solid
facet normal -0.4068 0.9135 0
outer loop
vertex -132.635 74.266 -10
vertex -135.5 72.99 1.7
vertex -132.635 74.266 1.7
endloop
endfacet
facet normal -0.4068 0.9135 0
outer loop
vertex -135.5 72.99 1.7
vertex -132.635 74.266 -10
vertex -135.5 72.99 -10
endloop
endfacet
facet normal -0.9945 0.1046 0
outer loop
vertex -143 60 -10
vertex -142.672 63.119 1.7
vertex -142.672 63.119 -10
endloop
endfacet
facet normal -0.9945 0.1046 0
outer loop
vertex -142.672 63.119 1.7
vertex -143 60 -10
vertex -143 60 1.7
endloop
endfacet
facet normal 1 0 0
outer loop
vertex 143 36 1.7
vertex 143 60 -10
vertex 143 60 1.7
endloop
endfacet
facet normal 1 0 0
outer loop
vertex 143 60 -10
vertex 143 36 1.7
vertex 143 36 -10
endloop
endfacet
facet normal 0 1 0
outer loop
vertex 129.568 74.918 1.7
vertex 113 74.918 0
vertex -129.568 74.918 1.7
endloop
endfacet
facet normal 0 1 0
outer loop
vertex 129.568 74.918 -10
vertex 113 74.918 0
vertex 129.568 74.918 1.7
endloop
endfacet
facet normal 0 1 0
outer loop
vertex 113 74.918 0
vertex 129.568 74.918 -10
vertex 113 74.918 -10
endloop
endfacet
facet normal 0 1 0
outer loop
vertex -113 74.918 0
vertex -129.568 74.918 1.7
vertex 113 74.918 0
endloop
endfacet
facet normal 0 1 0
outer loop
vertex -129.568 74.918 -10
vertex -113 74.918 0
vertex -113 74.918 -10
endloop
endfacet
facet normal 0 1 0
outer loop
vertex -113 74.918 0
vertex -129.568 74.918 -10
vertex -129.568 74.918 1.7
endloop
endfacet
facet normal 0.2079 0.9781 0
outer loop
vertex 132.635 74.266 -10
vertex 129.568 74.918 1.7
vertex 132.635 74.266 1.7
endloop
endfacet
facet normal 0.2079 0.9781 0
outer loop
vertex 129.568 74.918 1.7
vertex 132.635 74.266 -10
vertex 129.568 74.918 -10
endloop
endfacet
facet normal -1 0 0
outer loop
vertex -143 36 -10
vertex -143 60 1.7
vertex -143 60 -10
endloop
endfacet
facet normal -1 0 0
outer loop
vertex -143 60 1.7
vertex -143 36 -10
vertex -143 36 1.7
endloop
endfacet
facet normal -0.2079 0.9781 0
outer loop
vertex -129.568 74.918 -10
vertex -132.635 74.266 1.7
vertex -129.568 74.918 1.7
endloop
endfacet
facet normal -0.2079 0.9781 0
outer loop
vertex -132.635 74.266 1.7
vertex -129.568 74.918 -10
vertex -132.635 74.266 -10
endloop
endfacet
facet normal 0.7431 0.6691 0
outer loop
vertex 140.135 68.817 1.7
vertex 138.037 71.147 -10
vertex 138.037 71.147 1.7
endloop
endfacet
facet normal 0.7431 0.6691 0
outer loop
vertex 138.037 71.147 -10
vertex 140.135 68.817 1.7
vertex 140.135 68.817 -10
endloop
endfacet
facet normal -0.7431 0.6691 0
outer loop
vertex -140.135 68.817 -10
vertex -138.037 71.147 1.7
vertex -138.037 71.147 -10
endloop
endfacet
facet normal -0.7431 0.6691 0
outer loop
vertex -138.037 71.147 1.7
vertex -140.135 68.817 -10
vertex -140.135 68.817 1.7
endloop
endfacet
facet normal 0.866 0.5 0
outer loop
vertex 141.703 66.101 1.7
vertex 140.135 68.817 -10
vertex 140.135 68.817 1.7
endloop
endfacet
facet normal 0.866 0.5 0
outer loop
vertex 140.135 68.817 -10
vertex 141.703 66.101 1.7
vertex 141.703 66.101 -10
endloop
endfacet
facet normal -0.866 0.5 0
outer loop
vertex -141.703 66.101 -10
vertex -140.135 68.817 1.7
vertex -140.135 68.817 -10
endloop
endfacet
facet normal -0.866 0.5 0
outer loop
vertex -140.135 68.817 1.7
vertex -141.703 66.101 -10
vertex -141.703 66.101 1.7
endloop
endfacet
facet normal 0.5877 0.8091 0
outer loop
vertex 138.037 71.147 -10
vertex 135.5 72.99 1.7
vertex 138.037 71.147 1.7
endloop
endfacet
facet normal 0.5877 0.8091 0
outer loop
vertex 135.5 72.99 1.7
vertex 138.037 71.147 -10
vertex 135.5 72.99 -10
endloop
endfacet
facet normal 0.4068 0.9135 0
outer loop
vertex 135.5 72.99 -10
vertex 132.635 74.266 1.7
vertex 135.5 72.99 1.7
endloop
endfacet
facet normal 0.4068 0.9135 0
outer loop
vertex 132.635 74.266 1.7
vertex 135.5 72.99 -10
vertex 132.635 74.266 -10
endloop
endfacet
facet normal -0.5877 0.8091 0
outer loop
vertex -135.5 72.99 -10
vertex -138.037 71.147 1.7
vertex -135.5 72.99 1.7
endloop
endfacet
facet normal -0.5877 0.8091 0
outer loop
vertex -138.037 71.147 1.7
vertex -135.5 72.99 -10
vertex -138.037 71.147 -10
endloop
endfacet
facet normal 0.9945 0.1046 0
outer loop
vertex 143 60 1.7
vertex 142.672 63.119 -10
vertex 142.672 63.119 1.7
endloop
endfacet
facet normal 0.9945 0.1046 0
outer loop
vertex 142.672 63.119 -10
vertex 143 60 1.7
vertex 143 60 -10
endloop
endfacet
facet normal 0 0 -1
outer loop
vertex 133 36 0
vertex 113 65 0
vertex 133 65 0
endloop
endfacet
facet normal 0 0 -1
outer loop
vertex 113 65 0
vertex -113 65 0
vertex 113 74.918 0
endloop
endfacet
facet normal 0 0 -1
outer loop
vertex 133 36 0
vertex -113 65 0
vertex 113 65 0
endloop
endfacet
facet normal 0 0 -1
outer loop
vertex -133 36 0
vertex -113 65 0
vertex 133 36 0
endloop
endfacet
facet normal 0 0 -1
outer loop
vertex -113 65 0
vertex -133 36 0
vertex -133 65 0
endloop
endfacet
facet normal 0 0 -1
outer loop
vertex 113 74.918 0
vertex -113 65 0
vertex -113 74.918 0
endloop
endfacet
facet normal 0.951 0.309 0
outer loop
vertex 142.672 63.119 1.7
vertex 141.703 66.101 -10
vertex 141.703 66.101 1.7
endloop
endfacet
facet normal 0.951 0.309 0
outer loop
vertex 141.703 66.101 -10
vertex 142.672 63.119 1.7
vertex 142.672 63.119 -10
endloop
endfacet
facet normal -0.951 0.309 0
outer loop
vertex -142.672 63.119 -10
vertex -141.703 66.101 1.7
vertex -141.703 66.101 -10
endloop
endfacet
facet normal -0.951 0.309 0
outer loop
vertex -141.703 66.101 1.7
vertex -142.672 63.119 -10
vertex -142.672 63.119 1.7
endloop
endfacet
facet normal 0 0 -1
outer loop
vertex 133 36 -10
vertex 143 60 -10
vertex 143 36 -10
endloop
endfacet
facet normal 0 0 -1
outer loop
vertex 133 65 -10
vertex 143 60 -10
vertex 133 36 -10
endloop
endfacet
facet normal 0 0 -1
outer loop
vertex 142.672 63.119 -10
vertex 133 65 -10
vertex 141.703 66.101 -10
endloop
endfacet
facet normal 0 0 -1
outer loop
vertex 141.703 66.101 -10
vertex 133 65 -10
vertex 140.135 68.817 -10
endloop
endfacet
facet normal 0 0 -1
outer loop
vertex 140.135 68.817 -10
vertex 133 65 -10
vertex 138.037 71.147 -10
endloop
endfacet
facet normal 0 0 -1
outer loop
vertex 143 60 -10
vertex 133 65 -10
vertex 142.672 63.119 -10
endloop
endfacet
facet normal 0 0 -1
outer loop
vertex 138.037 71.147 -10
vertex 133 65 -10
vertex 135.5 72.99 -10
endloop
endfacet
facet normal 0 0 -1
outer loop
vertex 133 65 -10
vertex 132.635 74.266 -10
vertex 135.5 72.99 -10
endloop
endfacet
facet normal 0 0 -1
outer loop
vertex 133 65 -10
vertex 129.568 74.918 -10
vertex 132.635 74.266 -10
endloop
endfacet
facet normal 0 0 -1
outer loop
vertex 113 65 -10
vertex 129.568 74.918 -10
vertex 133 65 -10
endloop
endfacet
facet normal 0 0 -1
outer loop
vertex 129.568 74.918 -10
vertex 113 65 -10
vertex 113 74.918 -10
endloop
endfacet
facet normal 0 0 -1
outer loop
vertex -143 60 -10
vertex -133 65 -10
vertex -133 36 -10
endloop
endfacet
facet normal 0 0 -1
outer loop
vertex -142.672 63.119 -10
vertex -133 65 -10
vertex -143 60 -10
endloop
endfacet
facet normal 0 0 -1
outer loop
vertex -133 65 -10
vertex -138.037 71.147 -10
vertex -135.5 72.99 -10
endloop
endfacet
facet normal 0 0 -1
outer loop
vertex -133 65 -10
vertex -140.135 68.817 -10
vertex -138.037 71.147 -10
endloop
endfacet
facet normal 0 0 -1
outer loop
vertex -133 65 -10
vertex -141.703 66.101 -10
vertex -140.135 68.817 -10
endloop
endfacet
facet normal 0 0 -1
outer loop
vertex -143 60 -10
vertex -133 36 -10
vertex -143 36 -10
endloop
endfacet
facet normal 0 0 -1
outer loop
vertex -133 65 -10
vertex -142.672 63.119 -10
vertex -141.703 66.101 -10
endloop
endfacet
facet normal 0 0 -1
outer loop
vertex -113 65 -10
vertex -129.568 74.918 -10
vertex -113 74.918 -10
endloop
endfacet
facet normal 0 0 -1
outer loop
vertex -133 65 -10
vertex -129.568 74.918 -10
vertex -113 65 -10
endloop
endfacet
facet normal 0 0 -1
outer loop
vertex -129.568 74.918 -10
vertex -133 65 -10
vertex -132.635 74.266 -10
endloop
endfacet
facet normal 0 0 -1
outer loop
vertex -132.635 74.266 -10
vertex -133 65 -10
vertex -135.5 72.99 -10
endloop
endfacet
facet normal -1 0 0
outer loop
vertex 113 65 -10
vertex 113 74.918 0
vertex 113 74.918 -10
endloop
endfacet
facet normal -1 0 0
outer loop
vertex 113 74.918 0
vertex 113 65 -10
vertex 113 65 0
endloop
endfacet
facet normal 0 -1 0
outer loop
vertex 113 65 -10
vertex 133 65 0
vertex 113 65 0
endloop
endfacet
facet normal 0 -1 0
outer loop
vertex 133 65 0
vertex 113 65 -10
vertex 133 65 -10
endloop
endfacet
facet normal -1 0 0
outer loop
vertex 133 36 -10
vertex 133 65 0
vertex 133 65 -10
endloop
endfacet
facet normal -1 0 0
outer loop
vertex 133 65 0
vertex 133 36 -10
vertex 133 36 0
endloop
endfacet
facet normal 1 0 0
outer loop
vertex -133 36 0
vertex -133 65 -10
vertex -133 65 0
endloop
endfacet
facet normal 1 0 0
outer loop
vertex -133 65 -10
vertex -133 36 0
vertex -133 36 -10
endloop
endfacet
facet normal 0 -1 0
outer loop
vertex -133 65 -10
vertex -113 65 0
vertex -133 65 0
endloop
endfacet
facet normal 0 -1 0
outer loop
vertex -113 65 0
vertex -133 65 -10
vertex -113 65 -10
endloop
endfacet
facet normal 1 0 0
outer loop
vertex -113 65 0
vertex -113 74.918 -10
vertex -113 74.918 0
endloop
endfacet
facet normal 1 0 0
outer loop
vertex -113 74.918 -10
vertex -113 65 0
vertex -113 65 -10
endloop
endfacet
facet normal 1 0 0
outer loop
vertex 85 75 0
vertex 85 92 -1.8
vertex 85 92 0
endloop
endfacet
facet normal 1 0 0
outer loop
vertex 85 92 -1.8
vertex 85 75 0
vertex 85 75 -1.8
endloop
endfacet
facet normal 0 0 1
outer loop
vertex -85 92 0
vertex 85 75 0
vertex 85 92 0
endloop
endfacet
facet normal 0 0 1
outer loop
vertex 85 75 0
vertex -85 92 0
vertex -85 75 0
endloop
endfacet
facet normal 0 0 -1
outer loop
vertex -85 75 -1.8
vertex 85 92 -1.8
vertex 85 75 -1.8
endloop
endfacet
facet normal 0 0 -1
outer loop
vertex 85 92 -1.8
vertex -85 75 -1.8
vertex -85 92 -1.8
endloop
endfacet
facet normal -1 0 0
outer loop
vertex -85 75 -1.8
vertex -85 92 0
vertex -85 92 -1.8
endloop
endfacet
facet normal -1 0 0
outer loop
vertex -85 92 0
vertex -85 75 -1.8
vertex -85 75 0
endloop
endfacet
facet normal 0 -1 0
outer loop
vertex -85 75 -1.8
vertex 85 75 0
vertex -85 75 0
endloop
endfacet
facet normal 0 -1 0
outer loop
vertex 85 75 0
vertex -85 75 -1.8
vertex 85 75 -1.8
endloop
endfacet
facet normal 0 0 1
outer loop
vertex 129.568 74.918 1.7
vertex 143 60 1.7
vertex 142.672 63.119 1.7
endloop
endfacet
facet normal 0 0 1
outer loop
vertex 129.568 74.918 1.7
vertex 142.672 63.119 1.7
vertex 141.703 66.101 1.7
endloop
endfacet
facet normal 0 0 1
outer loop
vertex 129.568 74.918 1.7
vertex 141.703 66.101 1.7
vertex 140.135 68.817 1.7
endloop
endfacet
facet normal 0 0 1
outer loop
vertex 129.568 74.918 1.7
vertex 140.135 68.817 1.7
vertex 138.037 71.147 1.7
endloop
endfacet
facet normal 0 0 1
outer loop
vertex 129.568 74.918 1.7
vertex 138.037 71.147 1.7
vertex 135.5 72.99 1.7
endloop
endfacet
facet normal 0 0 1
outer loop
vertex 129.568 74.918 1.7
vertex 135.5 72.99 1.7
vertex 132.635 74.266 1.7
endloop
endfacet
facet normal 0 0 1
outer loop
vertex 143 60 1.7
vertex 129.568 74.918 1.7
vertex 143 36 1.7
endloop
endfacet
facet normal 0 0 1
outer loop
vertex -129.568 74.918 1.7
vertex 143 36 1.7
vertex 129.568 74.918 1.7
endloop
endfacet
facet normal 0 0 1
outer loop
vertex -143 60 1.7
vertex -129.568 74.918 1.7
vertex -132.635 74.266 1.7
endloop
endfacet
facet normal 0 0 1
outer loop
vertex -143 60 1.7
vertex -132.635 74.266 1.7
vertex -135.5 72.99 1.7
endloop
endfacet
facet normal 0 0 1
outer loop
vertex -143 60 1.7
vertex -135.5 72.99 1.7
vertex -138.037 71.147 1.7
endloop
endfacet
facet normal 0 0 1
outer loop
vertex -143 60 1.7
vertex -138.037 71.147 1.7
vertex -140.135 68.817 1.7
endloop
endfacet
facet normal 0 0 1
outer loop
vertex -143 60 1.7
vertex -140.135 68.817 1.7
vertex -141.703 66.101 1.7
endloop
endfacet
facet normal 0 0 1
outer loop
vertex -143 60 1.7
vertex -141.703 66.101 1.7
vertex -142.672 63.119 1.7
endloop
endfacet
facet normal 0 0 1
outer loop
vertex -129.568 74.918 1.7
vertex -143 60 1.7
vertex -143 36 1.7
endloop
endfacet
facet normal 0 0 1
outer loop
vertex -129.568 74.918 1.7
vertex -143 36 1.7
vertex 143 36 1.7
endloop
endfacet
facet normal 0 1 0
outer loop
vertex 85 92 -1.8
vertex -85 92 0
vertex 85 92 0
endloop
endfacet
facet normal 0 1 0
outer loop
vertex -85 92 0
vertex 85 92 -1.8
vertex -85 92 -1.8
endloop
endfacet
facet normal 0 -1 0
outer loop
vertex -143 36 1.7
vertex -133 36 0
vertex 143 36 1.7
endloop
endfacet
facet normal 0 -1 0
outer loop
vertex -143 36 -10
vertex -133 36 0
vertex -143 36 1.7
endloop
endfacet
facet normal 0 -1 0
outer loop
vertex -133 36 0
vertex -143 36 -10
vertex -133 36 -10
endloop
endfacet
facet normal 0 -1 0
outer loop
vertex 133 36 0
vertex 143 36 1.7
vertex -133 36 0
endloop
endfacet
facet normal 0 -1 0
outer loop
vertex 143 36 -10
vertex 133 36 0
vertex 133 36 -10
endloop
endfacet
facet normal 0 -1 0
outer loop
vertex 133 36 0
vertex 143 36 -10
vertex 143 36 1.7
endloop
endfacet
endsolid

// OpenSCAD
// file: ../../lib/project/util.scad
// lib/project/util.scad

module rounded_rect_2d(size = [10, 10], r = 2) {
  x = size[0];
  y = size[1];
  rr = min(r, min(x, y) / 2);

  hull() {
    for (sx = [-1, 1], sy = [-1, 1]) {
      translate([sx * (x / 2 - rr), sy * (y / 2 - rr)])
        circle(r = rr);
    }
  }
}
// file: ../../lib/project/params.scad
// lib/project/params.scad
// Shared project parameters for the final tray and all fit-test models.

debug = false;

// Main tray footprint.
tray_w = 286;
tray_d = 150;
tray_corner_r = 15;

// Top tray shell.
tray_floor_t = 2.4;
tray_wall_h = 9;
top_wall_w = 10;

// Underside support lip and rear support section.
support_lip_drop = 10;
support_lip_w = 10;
rear_gap_w = 28;
rear_tongue_w = 170;
rear_tongue_depth = 34;
rear_tongue_t = 1.8;

// Cup holder location and plug geometry.
cup_spacing = 118;
cup_y_from_front = 72;
plug_top_d = 85;
plug_bottom_d = 73;
plug_h = 62;
plug_clearance_z = 0;

// Fit-test defaults.
test_plug_top_ds = [84, 85, 86];
test_spacing_values = [116, 118, 120];
test_lip_drop_values = [8, 10, 12];
test_rear_tongue_ts = [1.4, 1.8, 2.2];
test_frame_wall_w = 12;
test_front_zone_depth = 100;
test_rear_zone_depth = 56;
test_gap_section_w = 140;
test_coupon_spacing = 18;
// main file
use <../../lib/project/console_tray.scad>;
include <../../lib/project/params.scad>;

rear_tongue_test_variant(
  tray_w = tray_w,
  tray_d = tray_d,
  tray_corner_r = tray_corner_r,
  tray_floor_t = tray_floor_t,
  tray_wall_h = tray_wall_h,
  top_wall_w = top_wall_w,
  support_lip_drop = support_lip_drop,
  support_lip_w = support_lip_w,
  rear_gap_w = rear_gap_w,
  rear_tongue_w = rear_tongue_w,
  rear_tongue_depth = rear_tongue_depth,
  rear_tongue_t = rear_tongue_t,
  rear_zone_depth = test_rear_zone_depth
);
